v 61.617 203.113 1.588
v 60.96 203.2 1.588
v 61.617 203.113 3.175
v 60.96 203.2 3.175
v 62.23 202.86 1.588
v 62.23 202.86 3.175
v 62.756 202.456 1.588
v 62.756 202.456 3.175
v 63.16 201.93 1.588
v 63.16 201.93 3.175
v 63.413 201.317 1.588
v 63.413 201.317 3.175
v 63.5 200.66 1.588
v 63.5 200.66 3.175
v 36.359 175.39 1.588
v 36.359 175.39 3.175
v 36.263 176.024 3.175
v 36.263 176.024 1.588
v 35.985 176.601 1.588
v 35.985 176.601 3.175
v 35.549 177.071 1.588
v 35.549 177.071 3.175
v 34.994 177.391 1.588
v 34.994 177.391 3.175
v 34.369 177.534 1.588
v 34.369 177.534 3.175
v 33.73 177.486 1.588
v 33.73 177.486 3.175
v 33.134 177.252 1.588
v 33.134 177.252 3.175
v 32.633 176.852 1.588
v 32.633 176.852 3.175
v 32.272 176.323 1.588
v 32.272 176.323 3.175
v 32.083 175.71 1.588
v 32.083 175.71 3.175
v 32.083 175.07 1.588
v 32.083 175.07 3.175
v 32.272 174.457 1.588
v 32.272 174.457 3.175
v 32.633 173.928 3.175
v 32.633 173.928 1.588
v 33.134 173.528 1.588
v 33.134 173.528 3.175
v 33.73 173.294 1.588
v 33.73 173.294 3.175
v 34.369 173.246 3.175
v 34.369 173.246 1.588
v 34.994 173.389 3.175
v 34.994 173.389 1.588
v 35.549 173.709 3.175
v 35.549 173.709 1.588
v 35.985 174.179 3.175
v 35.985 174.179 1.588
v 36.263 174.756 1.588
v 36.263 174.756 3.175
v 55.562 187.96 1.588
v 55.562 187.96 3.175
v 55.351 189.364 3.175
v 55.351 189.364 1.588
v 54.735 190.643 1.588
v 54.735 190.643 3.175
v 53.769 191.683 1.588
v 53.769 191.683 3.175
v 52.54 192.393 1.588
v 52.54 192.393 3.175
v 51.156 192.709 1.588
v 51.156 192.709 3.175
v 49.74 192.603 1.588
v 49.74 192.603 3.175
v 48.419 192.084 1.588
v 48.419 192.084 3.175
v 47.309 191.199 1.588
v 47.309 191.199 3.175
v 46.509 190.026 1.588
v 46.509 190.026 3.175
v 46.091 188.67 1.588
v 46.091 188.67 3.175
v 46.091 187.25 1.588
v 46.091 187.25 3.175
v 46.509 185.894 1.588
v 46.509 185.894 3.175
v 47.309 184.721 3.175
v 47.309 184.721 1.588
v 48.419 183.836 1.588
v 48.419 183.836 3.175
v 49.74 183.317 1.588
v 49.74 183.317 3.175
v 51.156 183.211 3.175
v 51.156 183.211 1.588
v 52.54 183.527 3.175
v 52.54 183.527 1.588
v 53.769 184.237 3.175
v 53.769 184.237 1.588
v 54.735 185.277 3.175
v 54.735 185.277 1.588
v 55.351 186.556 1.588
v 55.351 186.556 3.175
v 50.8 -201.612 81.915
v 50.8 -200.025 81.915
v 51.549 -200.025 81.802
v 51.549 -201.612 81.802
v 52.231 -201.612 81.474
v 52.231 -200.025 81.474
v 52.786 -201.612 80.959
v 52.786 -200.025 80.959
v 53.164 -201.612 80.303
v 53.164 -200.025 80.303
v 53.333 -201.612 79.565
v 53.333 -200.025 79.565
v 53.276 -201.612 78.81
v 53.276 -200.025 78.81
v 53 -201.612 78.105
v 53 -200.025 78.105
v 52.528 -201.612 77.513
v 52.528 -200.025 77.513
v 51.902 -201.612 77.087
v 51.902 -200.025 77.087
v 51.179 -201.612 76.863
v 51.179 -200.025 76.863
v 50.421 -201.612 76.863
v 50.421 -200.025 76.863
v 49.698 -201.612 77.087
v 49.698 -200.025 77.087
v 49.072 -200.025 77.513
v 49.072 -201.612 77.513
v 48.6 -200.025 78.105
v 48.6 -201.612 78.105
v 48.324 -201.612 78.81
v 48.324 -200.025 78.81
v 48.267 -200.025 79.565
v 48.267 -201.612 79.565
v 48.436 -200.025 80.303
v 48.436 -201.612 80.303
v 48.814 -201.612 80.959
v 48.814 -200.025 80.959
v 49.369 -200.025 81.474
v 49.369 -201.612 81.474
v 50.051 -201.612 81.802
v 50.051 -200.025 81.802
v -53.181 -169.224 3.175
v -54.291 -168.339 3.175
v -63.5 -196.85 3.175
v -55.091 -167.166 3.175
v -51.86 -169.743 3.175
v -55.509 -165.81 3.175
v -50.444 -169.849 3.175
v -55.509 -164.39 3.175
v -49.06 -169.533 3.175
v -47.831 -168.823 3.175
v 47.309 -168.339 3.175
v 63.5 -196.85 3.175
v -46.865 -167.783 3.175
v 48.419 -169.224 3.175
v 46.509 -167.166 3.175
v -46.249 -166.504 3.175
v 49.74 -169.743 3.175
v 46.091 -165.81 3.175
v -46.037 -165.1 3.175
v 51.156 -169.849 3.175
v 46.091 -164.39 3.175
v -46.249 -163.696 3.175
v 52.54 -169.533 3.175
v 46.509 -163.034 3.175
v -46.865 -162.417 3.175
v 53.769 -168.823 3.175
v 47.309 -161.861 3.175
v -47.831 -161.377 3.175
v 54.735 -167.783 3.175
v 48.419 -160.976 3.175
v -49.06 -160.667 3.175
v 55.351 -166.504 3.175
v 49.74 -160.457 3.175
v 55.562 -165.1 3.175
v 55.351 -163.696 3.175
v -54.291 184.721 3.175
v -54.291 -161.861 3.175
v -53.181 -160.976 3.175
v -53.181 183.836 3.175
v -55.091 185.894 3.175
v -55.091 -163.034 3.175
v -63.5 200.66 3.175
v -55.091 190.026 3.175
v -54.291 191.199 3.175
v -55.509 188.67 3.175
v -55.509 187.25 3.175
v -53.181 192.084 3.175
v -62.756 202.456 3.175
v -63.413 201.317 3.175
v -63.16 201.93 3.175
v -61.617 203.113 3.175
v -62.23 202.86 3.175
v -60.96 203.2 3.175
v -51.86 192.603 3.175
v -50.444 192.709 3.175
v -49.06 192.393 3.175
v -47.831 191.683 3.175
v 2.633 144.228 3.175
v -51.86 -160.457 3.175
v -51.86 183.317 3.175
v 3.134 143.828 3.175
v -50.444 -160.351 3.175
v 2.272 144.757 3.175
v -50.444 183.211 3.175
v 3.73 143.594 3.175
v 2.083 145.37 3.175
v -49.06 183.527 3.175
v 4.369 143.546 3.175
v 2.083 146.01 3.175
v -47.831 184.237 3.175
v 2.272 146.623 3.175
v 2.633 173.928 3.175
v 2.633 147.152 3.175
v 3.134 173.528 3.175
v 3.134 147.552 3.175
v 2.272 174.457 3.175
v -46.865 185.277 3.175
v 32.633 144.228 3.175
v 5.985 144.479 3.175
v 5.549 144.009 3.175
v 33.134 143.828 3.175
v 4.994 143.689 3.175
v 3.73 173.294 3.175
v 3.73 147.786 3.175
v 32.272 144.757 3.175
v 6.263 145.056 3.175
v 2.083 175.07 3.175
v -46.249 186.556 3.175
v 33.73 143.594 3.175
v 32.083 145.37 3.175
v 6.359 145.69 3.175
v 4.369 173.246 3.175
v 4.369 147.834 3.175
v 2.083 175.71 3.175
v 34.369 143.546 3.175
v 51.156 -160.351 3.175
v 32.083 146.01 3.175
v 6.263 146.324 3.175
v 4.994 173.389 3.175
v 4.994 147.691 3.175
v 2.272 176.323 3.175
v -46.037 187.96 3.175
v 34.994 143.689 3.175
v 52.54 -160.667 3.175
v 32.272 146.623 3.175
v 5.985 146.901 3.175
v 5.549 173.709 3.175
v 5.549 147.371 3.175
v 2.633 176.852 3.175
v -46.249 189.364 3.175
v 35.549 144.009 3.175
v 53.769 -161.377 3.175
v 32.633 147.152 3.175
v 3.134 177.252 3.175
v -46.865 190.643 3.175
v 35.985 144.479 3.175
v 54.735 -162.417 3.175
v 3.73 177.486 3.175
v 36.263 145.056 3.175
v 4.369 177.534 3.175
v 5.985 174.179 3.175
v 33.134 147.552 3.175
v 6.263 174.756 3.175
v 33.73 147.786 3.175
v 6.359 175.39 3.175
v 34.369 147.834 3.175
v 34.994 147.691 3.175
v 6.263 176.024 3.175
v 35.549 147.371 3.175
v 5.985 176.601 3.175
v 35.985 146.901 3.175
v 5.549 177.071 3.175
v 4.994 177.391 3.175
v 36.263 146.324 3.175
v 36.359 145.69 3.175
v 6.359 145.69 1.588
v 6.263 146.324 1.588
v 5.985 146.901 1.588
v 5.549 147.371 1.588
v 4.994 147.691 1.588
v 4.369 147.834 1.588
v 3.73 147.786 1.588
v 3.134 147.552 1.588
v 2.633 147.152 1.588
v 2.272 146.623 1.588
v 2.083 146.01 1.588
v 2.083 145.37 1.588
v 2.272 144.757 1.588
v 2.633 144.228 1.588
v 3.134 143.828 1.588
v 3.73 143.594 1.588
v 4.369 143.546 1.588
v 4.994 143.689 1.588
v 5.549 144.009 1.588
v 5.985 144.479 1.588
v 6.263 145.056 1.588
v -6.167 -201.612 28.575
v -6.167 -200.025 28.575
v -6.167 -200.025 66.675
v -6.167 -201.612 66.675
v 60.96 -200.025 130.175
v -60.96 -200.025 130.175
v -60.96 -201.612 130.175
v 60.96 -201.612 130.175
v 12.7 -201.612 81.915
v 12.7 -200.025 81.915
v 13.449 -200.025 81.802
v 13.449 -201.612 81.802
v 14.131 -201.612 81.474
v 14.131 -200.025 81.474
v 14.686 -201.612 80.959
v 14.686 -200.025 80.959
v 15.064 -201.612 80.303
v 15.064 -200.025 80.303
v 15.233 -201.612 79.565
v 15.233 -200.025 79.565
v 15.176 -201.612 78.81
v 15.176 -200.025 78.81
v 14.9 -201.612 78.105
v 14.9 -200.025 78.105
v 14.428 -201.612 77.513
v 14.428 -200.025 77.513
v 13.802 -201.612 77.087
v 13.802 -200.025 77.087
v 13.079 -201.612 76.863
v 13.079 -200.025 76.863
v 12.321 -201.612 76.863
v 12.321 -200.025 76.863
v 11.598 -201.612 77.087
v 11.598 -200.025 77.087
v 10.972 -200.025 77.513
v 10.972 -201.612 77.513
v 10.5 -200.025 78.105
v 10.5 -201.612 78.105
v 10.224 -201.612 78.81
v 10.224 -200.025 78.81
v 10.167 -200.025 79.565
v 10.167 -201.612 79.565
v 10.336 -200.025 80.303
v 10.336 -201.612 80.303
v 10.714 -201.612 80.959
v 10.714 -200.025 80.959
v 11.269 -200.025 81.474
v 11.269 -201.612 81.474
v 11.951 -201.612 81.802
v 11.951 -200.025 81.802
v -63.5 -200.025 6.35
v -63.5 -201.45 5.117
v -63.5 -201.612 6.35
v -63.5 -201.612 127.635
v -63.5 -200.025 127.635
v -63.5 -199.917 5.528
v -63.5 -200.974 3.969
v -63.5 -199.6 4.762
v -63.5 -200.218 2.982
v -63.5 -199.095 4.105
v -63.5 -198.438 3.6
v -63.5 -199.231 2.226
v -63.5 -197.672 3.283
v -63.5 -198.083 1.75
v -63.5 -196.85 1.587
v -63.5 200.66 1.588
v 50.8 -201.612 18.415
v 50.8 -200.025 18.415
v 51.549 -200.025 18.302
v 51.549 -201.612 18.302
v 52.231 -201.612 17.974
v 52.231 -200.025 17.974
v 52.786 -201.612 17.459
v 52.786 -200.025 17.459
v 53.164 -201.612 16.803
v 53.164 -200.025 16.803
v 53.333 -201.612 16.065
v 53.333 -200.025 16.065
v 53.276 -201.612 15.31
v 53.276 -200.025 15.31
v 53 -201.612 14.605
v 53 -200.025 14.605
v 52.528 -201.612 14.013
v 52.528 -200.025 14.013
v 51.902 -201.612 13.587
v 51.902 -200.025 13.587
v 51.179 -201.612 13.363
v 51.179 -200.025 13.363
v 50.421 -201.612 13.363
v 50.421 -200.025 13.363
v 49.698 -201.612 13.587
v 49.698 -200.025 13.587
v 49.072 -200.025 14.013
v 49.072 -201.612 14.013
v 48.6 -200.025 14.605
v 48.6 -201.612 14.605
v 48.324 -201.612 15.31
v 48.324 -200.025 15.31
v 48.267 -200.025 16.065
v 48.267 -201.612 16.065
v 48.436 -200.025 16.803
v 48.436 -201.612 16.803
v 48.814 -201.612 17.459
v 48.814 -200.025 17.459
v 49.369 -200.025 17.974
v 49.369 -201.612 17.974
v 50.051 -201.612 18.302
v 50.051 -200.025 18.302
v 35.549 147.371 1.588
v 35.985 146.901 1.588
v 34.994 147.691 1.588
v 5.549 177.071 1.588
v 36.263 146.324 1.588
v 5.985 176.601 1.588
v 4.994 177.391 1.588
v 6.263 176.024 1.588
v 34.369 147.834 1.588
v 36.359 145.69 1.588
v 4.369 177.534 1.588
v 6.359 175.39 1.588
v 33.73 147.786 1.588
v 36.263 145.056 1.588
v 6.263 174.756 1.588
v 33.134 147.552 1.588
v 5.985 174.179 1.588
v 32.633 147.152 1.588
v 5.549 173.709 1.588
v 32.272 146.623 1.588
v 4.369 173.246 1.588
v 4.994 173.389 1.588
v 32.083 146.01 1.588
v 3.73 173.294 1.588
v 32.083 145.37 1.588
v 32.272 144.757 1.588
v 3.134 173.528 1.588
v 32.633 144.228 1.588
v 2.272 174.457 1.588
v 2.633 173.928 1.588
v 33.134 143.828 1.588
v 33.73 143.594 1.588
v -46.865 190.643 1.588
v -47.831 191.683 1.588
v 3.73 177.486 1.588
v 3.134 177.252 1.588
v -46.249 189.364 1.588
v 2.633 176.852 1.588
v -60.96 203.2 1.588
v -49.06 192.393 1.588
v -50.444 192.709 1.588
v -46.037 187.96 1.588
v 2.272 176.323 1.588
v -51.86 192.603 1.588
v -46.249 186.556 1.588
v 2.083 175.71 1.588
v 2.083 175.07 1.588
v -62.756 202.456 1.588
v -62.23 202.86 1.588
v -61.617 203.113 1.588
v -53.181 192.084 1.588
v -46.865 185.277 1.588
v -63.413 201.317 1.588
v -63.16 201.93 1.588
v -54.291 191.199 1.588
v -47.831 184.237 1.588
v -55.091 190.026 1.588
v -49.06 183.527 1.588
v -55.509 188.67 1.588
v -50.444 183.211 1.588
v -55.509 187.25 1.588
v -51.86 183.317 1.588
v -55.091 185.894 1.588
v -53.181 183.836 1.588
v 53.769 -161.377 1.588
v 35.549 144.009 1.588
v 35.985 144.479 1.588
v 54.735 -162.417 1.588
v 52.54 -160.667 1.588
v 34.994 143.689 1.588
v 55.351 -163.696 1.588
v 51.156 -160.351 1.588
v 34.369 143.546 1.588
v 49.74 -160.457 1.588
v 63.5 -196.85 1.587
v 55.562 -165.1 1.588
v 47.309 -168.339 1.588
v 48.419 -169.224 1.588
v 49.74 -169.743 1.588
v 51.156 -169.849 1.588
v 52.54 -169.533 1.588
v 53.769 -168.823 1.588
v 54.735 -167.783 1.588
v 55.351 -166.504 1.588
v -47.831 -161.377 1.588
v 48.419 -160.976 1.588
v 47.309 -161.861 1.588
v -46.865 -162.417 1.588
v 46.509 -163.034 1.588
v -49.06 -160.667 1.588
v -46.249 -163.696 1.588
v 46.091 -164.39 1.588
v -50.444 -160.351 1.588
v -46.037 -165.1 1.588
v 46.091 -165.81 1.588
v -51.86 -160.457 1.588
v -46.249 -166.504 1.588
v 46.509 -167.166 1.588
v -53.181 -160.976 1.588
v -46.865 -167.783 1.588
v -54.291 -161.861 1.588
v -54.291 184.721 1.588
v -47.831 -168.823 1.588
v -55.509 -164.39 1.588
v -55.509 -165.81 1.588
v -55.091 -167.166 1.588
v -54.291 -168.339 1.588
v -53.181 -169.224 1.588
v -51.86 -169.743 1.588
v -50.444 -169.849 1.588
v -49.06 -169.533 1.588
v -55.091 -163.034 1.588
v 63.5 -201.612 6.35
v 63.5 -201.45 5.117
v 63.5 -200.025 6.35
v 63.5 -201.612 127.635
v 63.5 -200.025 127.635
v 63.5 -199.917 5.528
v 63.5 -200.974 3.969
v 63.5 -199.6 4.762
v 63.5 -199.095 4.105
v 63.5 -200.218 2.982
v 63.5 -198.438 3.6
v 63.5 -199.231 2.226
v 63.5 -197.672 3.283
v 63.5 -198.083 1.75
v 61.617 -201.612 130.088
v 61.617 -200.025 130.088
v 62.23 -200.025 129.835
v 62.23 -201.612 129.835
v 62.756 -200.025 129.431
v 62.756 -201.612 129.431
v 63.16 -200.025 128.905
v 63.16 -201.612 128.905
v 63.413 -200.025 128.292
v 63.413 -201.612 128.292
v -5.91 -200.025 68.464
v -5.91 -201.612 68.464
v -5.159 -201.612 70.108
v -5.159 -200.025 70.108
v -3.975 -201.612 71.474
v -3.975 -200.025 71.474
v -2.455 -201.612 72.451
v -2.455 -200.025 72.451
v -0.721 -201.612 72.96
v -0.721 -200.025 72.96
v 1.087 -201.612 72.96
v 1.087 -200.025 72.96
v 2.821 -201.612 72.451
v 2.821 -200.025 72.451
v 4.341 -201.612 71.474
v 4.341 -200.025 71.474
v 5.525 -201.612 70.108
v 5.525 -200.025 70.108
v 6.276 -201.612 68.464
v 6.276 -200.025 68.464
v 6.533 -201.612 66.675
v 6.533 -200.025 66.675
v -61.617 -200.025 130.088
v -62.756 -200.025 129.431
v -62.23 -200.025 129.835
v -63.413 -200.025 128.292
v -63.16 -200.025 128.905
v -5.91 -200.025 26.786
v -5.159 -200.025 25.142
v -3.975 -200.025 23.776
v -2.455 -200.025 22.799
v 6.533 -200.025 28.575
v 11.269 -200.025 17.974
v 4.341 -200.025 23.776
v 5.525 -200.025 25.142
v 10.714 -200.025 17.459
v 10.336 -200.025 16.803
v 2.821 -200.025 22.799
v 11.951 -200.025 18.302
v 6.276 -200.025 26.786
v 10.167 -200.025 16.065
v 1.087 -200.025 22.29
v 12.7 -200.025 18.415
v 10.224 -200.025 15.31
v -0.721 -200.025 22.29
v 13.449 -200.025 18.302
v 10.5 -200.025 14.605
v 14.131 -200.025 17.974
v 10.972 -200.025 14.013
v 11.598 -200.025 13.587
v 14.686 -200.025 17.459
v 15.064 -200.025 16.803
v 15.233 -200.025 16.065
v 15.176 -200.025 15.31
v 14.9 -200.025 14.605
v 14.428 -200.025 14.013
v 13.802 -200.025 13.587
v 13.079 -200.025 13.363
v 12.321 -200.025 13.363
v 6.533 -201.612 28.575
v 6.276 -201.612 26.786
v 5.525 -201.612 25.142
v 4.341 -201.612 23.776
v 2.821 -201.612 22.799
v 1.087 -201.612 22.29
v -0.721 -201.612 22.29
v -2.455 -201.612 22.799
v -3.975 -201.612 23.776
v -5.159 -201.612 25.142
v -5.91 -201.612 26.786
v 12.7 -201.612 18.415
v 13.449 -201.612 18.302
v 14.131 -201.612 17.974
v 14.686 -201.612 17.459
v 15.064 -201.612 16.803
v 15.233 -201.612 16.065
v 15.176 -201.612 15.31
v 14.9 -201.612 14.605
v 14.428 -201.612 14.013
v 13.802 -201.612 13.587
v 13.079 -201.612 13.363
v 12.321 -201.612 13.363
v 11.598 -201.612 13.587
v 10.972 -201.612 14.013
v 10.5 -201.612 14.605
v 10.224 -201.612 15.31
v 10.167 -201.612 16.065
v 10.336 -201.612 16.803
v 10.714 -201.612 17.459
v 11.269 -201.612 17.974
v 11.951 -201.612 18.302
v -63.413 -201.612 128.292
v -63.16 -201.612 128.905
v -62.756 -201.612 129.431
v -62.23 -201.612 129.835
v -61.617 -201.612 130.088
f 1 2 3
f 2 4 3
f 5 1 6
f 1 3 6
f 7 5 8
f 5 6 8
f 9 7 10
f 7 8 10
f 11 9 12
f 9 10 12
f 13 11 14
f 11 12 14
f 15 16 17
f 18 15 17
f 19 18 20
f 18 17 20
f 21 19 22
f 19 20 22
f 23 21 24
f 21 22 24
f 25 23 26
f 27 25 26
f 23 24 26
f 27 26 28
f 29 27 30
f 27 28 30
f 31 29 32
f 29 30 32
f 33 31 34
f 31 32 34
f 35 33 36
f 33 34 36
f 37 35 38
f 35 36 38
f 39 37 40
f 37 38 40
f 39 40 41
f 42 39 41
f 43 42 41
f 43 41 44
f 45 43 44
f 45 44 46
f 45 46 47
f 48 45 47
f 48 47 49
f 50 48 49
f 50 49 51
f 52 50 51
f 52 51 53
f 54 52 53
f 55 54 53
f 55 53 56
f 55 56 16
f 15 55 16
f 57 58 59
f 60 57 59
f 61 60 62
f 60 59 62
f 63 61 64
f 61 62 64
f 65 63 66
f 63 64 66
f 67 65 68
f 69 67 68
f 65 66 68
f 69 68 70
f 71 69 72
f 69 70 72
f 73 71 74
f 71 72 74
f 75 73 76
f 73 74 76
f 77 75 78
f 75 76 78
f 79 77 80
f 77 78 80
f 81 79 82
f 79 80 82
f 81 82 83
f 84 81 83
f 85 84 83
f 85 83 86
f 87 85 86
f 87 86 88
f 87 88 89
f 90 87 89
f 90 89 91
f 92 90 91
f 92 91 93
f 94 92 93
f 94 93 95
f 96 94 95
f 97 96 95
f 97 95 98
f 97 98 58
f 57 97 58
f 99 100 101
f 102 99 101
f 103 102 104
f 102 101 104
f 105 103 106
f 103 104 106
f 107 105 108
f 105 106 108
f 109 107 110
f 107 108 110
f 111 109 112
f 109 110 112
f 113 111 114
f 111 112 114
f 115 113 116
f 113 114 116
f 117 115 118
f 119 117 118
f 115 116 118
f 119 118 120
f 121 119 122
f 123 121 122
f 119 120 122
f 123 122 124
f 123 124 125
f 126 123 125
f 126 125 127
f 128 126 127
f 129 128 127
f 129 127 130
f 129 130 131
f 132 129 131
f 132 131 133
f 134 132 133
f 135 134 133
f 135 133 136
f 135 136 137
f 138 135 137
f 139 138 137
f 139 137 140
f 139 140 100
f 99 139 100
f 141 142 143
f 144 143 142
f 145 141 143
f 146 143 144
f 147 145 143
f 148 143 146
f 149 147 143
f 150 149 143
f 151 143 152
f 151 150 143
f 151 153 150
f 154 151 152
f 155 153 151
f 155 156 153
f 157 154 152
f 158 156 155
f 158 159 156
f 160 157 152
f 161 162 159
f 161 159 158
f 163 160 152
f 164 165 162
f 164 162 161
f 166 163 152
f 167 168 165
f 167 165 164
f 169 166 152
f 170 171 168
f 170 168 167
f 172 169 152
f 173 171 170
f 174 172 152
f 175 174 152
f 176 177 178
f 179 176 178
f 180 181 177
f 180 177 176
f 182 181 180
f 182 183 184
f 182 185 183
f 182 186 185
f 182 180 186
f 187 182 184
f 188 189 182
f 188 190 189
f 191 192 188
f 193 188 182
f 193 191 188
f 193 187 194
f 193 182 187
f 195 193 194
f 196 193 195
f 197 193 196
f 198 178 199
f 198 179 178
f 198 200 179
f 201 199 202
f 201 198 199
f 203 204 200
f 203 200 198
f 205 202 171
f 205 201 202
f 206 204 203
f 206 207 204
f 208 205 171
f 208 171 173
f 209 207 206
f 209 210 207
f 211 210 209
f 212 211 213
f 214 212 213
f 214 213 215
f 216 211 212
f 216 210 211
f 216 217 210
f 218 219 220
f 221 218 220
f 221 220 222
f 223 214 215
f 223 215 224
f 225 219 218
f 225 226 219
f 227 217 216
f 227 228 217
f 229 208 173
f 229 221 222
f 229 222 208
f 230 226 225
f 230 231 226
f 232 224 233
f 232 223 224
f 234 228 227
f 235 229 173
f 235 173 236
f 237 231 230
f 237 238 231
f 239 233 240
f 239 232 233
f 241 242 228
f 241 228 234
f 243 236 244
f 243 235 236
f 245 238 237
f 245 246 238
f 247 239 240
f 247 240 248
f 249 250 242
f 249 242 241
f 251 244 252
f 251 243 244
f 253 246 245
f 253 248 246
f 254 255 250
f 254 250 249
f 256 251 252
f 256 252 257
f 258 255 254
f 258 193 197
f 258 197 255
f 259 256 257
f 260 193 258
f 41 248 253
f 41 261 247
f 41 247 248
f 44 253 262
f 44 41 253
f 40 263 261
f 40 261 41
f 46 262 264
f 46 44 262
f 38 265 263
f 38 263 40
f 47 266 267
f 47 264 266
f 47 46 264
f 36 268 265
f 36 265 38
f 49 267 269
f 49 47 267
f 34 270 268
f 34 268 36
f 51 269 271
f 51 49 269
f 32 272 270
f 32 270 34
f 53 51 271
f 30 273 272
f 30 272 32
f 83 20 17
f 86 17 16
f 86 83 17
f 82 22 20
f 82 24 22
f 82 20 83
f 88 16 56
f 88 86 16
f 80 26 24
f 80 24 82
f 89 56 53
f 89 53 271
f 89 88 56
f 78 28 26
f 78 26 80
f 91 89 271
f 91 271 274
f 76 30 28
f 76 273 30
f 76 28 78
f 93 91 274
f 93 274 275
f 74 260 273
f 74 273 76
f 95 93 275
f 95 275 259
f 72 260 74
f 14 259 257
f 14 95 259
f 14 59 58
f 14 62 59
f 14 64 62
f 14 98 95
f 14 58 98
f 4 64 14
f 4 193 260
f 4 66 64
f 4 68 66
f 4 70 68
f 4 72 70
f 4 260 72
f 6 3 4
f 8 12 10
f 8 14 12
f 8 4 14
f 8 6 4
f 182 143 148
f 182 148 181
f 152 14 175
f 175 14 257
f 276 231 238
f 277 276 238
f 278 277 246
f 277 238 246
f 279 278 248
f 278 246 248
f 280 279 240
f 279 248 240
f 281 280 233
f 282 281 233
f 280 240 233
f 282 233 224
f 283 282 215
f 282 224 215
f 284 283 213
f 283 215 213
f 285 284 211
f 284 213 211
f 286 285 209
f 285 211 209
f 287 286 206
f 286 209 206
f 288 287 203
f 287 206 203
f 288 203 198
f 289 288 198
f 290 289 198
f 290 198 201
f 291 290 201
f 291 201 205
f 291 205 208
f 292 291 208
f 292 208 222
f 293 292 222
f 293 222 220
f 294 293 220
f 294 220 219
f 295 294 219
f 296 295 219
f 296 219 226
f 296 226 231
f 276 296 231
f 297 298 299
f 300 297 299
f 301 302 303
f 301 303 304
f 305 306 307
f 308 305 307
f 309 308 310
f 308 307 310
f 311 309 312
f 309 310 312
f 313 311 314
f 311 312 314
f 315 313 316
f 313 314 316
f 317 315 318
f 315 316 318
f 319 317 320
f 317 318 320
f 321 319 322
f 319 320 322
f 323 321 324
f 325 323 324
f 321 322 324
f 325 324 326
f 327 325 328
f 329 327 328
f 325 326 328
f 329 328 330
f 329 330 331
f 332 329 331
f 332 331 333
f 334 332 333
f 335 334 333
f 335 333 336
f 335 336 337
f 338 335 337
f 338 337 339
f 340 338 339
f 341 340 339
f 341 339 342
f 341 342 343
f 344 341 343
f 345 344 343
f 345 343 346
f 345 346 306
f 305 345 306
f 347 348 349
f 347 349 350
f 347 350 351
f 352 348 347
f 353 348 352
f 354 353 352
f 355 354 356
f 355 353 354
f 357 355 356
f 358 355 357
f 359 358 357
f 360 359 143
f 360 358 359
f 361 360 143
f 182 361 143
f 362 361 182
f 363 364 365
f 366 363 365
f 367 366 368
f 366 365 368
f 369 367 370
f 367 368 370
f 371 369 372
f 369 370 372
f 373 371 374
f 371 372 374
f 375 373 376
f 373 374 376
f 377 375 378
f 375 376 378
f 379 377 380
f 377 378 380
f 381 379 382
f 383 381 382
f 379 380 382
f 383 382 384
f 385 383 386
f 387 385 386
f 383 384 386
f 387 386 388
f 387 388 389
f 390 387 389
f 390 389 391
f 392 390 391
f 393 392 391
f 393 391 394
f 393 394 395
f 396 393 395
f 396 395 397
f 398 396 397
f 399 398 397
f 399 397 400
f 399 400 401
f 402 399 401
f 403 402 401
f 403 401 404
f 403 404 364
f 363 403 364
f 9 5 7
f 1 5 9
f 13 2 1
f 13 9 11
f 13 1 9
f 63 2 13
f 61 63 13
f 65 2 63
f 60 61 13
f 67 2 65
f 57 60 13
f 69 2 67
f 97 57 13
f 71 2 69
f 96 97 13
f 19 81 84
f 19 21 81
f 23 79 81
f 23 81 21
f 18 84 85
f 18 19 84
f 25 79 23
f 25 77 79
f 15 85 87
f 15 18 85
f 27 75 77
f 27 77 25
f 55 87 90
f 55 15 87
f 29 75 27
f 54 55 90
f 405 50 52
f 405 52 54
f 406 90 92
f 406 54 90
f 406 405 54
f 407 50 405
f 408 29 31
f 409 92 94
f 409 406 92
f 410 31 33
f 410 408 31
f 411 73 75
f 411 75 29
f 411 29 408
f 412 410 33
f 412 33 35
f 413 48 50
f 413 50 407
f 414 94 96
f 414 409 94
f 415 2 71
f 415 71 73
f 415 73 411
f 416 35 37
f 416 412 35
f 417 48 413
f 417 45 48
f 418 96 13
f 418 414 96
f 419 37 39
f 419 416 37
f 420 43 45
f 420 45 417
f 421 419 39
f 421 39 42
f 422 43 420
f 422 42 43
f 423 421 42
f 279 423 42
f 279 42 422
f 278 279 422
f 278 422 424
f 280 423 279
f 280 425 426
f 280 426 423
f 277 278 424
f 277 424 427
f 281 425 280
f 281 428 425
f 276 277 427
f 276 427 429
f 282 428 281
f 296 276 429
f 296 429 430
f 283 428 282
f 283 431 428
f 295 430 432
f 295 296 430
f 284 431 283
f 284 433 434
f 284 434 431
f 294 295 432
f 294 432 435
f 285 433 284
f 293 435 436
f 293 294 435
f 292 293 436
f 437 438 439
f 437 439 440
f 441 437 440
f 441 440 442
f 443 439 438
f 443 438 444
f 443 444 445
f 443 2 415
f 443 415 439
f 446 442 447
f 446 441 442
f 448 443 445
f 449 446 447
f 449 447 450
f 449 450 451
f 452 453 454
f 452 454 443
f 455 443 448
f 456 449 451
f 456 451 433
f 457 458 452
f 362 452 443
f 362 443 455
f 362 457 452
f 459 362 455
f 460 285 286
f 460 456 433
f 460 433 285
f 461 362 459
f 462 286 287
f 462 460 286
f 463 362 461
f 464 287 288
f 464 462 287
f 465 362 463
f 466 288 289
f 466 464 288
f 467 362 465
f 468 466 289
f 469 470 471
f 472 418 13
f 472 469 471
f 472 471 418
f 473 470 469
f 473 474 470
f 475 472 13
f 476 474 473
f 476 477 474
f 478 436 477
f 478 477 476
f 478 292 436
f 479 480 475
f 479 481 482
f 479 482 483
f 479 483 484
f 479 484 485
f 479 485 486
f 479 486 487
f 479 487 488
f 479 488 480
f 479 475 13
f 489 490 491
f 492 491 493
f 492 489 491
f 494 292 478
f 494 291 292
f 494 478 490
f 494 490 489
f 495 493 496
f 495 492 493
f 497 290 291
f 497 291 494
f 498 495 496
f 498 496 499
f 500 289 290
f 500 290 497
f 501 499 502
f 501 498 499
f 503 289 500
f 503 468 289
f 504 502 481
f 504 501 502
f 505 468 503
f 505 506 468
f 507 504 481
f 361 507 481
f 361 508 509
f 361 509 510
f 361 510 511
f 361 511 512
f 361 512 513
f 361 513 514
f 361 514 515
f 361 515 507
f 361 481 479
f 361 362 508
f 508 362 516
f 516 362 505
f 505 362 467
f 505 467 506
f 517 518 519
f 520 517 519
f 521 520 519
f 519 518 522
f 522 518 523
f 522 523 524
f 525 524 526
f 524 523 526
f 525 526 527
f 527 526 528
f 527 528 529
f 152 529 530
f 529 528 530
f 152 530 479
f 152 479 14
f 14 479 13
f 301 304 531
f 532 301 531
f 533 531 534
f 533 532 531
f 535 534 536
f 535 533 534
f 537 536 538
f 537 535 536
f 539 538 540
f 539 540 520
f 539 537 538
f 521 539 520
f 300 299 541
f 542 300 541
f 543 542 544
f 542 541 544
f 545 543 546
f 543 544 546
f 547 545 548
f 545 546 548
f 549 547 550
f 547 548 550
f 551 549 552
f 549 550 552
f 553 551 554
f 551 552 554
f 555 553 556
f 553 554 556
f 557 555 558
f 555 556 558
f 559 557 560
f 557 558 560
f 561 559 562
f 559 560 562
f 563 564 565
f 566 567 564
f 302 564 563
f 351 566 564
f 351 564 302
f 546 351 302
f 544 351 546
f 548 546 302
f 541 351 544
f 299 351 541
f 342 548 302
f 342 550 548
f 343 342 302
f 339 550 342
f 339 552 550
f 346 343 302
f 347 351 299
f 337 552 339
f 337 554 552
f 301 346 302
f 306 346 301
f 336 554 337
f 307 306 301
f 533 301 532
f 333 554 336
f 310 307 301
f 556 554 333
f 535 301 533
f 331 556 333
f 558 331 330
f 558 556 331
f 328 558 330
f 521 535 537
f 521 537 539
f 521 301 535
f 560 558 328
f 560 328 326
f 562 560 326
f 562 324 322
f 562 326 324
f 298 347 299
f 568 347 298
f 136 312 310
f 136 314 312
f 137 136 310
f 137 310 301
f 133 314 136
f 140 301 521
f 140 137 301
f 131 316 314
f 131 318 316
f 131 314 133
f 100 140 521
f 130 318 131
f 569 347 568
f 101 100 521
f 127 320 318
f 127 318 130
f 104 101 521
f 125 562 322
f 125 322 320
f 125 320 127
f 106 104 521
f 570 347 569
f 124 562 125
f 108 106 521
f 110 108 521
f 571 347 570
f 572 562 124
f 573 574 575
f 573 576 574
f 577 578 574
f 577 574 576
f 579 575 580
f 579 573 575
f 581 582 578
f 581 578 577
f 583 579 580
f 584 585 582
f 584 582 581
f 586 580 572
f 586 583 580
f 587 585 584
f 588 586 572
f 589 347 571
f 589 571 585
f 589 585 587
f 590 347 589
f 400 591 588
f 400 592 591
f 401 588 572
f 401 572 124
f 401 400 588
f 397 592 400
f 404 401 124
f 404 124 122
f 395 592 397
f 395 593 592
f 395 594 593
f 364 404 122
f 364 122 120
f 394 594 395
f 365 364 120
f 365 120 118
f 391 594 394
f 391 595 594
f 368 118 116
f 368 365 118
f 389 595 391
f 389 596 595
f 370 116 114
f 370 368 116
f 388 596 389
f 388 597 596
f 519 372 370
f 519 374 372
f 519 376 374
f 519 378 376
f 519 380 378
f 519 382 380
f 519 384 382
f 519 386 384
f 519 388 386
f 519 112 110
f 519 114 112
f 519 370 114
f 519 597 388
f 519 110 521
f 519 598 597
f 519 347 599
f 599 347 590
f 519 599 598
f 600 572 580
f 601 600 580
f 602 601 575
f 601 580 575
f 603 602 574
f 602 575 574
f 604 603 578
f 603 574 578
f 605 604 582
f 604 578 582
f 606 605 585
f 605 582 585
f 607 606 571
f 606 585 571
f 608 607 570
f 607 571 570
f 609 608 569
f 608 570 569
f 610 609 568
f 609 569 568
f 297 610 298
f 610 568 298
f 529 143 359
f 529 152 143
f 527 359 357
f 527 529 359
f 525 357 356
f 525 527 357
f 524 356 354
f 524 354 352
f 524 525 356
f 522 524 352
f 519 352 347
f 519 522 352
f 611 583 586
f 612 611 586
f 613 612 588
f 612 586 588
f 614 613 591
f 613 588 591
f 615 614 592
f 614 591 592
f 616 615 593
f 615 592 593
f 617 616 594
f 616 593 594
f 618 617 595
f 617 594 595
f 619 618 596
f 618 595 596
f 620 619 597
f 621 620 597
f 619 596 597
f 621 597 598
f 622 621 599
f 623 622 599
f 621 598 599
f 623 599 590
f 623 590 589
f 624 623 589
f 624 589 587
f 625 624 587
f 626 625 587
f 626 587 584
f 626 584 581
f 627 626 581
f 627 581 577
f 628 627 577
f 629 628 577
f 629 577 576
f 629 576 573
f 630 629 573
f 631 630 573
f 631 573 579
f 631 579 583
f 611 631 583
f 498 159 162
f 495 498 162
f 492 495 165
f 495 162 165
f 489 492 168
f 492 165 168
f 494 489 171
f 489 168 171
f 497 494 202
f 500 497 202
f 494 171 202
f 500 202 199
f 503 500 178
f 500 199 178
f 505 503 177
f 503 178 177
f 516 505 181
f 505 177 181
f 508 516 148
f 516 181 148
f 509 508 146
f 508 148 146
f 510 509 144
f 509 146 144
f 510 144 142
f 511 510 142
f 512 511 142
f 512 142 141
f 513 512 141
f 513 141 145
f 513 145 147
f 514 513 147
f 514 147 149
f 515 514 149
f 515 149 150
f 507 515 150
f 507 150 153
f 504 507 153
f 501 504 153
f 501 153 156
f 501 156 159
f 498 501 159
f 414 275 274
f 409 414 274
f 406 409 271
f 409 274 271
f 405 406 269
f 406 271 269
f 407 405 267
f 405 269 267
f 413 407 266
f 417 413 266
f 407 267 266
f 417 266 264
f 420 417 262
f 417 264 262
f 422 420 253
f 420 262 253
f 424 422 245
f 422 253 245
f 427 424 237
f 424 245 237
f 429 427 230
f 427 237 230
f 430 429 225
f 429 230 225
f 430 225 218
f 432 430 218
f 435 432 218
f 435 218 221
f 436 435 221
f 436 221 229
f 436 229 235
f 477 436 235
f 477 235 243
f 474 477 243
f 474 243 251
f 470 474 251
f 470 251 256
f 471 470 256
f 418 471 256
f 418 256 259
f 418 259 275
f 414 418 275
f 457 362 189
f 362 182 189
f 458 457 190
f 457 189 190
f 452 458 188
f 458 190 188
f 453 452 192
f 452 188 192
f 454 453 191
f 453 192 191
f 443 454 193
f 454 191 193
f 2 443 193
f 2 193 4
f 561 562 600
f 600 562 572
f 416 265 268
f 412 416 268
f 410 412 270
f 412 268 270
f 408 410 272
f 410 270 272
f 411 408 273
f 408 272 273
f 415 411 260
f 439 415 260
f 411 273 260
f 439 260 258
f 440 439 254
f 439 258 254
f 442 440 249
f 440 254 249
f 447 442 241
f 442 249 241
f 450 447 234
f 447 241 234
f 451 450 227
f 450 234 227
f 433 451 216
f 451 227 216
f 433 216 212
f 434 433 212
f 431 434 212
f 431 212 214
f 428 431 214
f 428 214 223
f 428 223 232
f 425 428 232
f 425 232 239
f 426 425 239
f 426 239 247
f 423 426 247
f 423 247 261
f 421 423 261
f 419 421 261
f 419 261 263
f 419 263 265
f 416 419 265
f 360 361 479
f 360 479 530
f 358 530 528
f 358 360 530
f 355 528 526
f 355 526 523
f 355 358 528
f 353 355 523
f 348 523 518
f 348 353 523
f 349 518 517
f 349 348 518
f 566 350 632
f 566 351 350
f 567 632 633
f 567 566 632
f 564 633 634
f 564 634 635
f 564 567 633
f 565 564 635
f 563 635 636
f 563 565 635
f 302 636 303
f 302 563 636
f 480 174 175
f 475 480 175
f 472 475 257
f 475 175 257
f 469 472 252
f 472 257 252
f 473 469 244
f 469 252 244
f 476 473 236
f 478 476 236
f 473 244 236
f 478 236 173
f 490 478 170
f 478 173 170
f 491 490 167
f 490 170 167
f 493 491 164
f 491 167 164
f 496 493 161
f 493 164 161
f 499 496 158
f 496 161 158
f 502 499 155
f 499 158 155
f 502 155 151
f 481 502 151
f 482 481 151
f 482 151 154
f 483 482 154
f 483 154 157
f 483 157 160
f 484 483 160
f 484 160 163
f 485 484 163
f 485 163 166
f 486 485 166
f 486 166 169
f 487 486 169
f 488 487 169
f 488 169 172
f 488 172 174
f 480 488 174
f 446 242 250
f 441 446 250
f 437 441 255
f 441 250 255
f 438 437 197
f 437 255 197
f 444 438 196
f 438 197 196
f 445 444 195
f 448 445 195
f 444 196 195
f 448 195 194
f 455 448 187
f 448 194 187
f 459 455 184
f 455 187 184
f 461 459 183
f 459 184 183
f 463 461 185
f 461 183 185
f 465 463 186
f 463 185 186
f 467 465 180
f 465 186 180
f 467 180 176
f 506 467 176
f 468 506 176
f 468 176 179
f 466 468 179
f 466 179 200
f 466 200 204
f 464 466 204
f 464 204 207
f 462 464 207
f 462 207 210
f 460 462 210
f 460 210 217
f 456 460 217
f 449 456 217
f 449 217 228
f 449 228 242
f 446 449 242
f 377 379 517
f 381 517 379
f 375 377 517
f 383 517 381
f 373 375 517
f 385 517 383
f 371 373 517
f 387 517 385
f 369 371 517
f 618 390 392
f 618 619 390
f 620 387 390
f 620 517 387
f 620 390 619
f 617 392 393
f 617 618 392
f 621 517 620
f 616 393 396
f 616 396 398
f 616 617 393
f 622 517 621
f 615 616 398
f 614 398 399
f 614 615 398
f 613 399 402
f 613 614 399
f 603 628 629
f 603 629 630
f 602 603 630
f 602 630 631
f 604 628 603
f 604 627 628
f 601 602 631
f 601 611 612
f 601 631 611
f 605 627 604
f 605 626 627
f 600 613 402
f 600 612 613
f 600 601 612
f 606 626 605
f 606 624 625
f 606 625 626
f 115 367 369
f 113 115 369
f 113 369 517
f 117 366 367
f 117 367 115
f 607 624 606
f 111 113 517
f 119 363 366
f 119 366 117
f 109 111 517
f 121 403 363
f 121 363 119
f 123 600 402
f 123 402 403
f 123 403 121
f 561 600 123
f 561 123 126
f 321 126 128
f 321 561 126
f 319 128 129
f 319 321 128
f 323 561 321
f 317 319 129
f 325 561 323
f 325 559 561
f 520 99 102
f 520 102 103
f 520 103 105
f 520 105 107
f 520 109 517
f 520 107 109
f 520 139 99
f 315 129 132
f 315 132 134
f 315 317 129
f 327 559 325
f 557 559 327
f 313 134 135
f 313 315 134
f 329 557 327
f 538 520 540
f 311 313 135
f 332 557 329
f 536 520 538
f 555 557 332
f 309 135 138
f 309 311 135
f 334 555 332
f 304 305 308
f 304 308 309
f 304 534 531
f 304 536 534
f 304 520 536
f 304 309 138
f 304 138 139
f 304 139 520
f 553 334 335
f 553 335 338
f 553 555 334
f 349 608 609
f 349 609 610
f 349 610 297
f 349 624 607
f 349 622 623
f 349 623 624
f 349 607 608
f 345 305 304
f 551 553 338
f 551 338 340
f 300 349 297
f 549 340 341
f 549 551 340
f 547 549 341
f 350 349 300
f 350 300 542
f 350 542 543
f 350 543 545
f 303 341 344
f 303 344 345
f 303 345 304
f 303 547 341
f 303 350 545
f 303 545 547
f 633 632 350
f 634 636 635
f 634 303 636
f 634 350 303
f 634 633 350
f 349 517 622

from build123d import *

# Parameters (mm, degrees)
SKETCH2_W            = 127
SKETCH2_H            = 406.4
BOSS_EXTRUDE1_DEPTH  = 3.175
SKETCH3_W            = 127
SKETCH3_H            = 3.175
BOSS_EXTRUDE2_DEPTH  = 127
FILLET1_R            = 3.175
SKETCH4_R            = 2.54
CUT_EXTRUDE1_DEPTH   = 429.448574802
SKETCH5_R            = 4.7625
SKETCH5_R_2          = 2.15
CUT_EXTRUDE2_DEPTH   = 248.894110458
CONVERT_SOLID1_START = -63.5
CONVERT_SOLID1_DEPTH = 127
FILLET2_R            = 2.54


# Read off the part's stored shape, not the designer's step: Convert-Solid1
with BuildPart() as part:
    # Sketch2 → Boss-Extrude1 (new body)
    with BuildSketch(Plane.XY):
        Rectangle(SKETCH2_W, SKETCH2_H)
    extrude(amount=BOSS_EXTRUDE1_DEPTH)

    # Sketch3 → Boss-Extrude2 (add)
    with BuildSketch(Plane.XY.offset(3.175)):
        with Locations((0, -201.6125)):
            Rectangle(SKETCH3_W, SKETCH3_H)
    extrude(amount=BOSS_EXTRUDE2_DEPTH)

    # Fillet1
    fillet1_edges = [part.edges().sort_by_distance(p)[0] for p in [
        (0, -200.025, 3.175),
        (0, -203.2, 0),
    ]]
    fillet(fillet1_edges, radius=FILLET1_R)

    # Sketch4 → Cut-Extrude1 (cut, through all)
    with BuildSketch(Plane(origin=(0, -200.025, 0), x_dir=(1, 0, 0), z_dir=(0, 1, 0))):
        with BuildLine():
            ThreePointArc((-6.167107762, -66.675), (0.182892238, -73.025), (6.532892238, -66.675))
            Line((6.532892238, -66.675), (6.532892238, -28.575))
            ThreePointArc((6.532892238, -28.575), (0.182892238, -22.225), (-6.167107762, -28.575))
            Line((-6.167107762, -28.575), (-6.167107762, -66.675))
        make_face()
        with Locations(Location((12.7, -79.375, 0), (0, 0, 270))):
            Circle(SKETCH4_R)
        with Locations(Location((50.8, -79.375, 0), (0, 0, 270))):
            Circle(SKETCH4_R)
        with Locations(Location((50.8, -15.875, 0), (0, 0, 270))):
            Circle(SKETCH4_R)
        with Locations(Location((12.7, -15.875, 0), (0, 0, 270))):
            Circle(SKETCH4_R)
    extrude(amount=-CUT_EXTRUDE1_DEPTH, mode=Mode.SUBTRACT)

    # Sketch5 → Cut-Extrude2 (cut, through all)
    with BuildSketch(Plane.XY.offset(3.175)):
        with Locations((-50.8, 187.96)):
            Circle(SKETCH5_R)
        with Locations((50.8, 187.96)):
            Circle(SKETCH5_R)
        with Locations((-50.8, -165.1)):
            Circle(SKETCH5_R)
        with Locations((50.8, -165.1)):
            Circle(SKETCH5_R)
        with Locations((34.20875, 175.39)):
            Circle(SKETCH5_R_2)
        with Locations((4.20875, 175.39)):
            Circle(SKETCH5_R_2)
        with Locations((4.20875, 145.69)):
            Circle(SKETCH5_R_2)
        with Locations((34.20875, 145.69)):
            Circle(SKETCH5_R_2)
    extrude(amount=-CUT_EXTRUDE2_DEPTH, mode=Mode.SUBTRACT)

    # Convert-Solid1 outline → Convert-Solid1 (cut)
    with BuildSketch(Plane.YZ.offset(CONVERT_SOLID1_START)):
        with BuildLine():
            ThreePointArc((-196.85, 1.5875), (-200.217596045, 2.982403955), (-201.6125, 6.35))
            Line((-201.6125, 6.35), (-201.6125, 130.175))
            Line((-201.6125, 130.175), (-203.2, 130.175))
            Line((-203.2, 130.175), (-203.2, 3.175))
            ThreePointArc((-203.2, 3.175), (-202.27006403, 0.92993597), (-200.025, 0))
            Line((-200.025, 0), (203.2, 0))
            Line((203.2, 0), (203.2, 1.5875))
            Line((203.2, 1.5875), (-196.85, 1.5875))
        make_face()
    extrude(amount=CONVERT_SOLID1_DEPTH, mode=Mode.SUBTRACT)

    # Fillet2
    fillet2_edges = [part.edges().sort_by_distance(p)[0] for p in [
        (63.5, -200.81875, 130.175),
        (-63.5, -200.81875, 130.175),
        (-63.5, 203.2, 2.38125),
        (63.5, 203.2, 2.38125),
    ]]
    fillet(fillet2_edges, radius=FILLET2_R)


solid = part.part
